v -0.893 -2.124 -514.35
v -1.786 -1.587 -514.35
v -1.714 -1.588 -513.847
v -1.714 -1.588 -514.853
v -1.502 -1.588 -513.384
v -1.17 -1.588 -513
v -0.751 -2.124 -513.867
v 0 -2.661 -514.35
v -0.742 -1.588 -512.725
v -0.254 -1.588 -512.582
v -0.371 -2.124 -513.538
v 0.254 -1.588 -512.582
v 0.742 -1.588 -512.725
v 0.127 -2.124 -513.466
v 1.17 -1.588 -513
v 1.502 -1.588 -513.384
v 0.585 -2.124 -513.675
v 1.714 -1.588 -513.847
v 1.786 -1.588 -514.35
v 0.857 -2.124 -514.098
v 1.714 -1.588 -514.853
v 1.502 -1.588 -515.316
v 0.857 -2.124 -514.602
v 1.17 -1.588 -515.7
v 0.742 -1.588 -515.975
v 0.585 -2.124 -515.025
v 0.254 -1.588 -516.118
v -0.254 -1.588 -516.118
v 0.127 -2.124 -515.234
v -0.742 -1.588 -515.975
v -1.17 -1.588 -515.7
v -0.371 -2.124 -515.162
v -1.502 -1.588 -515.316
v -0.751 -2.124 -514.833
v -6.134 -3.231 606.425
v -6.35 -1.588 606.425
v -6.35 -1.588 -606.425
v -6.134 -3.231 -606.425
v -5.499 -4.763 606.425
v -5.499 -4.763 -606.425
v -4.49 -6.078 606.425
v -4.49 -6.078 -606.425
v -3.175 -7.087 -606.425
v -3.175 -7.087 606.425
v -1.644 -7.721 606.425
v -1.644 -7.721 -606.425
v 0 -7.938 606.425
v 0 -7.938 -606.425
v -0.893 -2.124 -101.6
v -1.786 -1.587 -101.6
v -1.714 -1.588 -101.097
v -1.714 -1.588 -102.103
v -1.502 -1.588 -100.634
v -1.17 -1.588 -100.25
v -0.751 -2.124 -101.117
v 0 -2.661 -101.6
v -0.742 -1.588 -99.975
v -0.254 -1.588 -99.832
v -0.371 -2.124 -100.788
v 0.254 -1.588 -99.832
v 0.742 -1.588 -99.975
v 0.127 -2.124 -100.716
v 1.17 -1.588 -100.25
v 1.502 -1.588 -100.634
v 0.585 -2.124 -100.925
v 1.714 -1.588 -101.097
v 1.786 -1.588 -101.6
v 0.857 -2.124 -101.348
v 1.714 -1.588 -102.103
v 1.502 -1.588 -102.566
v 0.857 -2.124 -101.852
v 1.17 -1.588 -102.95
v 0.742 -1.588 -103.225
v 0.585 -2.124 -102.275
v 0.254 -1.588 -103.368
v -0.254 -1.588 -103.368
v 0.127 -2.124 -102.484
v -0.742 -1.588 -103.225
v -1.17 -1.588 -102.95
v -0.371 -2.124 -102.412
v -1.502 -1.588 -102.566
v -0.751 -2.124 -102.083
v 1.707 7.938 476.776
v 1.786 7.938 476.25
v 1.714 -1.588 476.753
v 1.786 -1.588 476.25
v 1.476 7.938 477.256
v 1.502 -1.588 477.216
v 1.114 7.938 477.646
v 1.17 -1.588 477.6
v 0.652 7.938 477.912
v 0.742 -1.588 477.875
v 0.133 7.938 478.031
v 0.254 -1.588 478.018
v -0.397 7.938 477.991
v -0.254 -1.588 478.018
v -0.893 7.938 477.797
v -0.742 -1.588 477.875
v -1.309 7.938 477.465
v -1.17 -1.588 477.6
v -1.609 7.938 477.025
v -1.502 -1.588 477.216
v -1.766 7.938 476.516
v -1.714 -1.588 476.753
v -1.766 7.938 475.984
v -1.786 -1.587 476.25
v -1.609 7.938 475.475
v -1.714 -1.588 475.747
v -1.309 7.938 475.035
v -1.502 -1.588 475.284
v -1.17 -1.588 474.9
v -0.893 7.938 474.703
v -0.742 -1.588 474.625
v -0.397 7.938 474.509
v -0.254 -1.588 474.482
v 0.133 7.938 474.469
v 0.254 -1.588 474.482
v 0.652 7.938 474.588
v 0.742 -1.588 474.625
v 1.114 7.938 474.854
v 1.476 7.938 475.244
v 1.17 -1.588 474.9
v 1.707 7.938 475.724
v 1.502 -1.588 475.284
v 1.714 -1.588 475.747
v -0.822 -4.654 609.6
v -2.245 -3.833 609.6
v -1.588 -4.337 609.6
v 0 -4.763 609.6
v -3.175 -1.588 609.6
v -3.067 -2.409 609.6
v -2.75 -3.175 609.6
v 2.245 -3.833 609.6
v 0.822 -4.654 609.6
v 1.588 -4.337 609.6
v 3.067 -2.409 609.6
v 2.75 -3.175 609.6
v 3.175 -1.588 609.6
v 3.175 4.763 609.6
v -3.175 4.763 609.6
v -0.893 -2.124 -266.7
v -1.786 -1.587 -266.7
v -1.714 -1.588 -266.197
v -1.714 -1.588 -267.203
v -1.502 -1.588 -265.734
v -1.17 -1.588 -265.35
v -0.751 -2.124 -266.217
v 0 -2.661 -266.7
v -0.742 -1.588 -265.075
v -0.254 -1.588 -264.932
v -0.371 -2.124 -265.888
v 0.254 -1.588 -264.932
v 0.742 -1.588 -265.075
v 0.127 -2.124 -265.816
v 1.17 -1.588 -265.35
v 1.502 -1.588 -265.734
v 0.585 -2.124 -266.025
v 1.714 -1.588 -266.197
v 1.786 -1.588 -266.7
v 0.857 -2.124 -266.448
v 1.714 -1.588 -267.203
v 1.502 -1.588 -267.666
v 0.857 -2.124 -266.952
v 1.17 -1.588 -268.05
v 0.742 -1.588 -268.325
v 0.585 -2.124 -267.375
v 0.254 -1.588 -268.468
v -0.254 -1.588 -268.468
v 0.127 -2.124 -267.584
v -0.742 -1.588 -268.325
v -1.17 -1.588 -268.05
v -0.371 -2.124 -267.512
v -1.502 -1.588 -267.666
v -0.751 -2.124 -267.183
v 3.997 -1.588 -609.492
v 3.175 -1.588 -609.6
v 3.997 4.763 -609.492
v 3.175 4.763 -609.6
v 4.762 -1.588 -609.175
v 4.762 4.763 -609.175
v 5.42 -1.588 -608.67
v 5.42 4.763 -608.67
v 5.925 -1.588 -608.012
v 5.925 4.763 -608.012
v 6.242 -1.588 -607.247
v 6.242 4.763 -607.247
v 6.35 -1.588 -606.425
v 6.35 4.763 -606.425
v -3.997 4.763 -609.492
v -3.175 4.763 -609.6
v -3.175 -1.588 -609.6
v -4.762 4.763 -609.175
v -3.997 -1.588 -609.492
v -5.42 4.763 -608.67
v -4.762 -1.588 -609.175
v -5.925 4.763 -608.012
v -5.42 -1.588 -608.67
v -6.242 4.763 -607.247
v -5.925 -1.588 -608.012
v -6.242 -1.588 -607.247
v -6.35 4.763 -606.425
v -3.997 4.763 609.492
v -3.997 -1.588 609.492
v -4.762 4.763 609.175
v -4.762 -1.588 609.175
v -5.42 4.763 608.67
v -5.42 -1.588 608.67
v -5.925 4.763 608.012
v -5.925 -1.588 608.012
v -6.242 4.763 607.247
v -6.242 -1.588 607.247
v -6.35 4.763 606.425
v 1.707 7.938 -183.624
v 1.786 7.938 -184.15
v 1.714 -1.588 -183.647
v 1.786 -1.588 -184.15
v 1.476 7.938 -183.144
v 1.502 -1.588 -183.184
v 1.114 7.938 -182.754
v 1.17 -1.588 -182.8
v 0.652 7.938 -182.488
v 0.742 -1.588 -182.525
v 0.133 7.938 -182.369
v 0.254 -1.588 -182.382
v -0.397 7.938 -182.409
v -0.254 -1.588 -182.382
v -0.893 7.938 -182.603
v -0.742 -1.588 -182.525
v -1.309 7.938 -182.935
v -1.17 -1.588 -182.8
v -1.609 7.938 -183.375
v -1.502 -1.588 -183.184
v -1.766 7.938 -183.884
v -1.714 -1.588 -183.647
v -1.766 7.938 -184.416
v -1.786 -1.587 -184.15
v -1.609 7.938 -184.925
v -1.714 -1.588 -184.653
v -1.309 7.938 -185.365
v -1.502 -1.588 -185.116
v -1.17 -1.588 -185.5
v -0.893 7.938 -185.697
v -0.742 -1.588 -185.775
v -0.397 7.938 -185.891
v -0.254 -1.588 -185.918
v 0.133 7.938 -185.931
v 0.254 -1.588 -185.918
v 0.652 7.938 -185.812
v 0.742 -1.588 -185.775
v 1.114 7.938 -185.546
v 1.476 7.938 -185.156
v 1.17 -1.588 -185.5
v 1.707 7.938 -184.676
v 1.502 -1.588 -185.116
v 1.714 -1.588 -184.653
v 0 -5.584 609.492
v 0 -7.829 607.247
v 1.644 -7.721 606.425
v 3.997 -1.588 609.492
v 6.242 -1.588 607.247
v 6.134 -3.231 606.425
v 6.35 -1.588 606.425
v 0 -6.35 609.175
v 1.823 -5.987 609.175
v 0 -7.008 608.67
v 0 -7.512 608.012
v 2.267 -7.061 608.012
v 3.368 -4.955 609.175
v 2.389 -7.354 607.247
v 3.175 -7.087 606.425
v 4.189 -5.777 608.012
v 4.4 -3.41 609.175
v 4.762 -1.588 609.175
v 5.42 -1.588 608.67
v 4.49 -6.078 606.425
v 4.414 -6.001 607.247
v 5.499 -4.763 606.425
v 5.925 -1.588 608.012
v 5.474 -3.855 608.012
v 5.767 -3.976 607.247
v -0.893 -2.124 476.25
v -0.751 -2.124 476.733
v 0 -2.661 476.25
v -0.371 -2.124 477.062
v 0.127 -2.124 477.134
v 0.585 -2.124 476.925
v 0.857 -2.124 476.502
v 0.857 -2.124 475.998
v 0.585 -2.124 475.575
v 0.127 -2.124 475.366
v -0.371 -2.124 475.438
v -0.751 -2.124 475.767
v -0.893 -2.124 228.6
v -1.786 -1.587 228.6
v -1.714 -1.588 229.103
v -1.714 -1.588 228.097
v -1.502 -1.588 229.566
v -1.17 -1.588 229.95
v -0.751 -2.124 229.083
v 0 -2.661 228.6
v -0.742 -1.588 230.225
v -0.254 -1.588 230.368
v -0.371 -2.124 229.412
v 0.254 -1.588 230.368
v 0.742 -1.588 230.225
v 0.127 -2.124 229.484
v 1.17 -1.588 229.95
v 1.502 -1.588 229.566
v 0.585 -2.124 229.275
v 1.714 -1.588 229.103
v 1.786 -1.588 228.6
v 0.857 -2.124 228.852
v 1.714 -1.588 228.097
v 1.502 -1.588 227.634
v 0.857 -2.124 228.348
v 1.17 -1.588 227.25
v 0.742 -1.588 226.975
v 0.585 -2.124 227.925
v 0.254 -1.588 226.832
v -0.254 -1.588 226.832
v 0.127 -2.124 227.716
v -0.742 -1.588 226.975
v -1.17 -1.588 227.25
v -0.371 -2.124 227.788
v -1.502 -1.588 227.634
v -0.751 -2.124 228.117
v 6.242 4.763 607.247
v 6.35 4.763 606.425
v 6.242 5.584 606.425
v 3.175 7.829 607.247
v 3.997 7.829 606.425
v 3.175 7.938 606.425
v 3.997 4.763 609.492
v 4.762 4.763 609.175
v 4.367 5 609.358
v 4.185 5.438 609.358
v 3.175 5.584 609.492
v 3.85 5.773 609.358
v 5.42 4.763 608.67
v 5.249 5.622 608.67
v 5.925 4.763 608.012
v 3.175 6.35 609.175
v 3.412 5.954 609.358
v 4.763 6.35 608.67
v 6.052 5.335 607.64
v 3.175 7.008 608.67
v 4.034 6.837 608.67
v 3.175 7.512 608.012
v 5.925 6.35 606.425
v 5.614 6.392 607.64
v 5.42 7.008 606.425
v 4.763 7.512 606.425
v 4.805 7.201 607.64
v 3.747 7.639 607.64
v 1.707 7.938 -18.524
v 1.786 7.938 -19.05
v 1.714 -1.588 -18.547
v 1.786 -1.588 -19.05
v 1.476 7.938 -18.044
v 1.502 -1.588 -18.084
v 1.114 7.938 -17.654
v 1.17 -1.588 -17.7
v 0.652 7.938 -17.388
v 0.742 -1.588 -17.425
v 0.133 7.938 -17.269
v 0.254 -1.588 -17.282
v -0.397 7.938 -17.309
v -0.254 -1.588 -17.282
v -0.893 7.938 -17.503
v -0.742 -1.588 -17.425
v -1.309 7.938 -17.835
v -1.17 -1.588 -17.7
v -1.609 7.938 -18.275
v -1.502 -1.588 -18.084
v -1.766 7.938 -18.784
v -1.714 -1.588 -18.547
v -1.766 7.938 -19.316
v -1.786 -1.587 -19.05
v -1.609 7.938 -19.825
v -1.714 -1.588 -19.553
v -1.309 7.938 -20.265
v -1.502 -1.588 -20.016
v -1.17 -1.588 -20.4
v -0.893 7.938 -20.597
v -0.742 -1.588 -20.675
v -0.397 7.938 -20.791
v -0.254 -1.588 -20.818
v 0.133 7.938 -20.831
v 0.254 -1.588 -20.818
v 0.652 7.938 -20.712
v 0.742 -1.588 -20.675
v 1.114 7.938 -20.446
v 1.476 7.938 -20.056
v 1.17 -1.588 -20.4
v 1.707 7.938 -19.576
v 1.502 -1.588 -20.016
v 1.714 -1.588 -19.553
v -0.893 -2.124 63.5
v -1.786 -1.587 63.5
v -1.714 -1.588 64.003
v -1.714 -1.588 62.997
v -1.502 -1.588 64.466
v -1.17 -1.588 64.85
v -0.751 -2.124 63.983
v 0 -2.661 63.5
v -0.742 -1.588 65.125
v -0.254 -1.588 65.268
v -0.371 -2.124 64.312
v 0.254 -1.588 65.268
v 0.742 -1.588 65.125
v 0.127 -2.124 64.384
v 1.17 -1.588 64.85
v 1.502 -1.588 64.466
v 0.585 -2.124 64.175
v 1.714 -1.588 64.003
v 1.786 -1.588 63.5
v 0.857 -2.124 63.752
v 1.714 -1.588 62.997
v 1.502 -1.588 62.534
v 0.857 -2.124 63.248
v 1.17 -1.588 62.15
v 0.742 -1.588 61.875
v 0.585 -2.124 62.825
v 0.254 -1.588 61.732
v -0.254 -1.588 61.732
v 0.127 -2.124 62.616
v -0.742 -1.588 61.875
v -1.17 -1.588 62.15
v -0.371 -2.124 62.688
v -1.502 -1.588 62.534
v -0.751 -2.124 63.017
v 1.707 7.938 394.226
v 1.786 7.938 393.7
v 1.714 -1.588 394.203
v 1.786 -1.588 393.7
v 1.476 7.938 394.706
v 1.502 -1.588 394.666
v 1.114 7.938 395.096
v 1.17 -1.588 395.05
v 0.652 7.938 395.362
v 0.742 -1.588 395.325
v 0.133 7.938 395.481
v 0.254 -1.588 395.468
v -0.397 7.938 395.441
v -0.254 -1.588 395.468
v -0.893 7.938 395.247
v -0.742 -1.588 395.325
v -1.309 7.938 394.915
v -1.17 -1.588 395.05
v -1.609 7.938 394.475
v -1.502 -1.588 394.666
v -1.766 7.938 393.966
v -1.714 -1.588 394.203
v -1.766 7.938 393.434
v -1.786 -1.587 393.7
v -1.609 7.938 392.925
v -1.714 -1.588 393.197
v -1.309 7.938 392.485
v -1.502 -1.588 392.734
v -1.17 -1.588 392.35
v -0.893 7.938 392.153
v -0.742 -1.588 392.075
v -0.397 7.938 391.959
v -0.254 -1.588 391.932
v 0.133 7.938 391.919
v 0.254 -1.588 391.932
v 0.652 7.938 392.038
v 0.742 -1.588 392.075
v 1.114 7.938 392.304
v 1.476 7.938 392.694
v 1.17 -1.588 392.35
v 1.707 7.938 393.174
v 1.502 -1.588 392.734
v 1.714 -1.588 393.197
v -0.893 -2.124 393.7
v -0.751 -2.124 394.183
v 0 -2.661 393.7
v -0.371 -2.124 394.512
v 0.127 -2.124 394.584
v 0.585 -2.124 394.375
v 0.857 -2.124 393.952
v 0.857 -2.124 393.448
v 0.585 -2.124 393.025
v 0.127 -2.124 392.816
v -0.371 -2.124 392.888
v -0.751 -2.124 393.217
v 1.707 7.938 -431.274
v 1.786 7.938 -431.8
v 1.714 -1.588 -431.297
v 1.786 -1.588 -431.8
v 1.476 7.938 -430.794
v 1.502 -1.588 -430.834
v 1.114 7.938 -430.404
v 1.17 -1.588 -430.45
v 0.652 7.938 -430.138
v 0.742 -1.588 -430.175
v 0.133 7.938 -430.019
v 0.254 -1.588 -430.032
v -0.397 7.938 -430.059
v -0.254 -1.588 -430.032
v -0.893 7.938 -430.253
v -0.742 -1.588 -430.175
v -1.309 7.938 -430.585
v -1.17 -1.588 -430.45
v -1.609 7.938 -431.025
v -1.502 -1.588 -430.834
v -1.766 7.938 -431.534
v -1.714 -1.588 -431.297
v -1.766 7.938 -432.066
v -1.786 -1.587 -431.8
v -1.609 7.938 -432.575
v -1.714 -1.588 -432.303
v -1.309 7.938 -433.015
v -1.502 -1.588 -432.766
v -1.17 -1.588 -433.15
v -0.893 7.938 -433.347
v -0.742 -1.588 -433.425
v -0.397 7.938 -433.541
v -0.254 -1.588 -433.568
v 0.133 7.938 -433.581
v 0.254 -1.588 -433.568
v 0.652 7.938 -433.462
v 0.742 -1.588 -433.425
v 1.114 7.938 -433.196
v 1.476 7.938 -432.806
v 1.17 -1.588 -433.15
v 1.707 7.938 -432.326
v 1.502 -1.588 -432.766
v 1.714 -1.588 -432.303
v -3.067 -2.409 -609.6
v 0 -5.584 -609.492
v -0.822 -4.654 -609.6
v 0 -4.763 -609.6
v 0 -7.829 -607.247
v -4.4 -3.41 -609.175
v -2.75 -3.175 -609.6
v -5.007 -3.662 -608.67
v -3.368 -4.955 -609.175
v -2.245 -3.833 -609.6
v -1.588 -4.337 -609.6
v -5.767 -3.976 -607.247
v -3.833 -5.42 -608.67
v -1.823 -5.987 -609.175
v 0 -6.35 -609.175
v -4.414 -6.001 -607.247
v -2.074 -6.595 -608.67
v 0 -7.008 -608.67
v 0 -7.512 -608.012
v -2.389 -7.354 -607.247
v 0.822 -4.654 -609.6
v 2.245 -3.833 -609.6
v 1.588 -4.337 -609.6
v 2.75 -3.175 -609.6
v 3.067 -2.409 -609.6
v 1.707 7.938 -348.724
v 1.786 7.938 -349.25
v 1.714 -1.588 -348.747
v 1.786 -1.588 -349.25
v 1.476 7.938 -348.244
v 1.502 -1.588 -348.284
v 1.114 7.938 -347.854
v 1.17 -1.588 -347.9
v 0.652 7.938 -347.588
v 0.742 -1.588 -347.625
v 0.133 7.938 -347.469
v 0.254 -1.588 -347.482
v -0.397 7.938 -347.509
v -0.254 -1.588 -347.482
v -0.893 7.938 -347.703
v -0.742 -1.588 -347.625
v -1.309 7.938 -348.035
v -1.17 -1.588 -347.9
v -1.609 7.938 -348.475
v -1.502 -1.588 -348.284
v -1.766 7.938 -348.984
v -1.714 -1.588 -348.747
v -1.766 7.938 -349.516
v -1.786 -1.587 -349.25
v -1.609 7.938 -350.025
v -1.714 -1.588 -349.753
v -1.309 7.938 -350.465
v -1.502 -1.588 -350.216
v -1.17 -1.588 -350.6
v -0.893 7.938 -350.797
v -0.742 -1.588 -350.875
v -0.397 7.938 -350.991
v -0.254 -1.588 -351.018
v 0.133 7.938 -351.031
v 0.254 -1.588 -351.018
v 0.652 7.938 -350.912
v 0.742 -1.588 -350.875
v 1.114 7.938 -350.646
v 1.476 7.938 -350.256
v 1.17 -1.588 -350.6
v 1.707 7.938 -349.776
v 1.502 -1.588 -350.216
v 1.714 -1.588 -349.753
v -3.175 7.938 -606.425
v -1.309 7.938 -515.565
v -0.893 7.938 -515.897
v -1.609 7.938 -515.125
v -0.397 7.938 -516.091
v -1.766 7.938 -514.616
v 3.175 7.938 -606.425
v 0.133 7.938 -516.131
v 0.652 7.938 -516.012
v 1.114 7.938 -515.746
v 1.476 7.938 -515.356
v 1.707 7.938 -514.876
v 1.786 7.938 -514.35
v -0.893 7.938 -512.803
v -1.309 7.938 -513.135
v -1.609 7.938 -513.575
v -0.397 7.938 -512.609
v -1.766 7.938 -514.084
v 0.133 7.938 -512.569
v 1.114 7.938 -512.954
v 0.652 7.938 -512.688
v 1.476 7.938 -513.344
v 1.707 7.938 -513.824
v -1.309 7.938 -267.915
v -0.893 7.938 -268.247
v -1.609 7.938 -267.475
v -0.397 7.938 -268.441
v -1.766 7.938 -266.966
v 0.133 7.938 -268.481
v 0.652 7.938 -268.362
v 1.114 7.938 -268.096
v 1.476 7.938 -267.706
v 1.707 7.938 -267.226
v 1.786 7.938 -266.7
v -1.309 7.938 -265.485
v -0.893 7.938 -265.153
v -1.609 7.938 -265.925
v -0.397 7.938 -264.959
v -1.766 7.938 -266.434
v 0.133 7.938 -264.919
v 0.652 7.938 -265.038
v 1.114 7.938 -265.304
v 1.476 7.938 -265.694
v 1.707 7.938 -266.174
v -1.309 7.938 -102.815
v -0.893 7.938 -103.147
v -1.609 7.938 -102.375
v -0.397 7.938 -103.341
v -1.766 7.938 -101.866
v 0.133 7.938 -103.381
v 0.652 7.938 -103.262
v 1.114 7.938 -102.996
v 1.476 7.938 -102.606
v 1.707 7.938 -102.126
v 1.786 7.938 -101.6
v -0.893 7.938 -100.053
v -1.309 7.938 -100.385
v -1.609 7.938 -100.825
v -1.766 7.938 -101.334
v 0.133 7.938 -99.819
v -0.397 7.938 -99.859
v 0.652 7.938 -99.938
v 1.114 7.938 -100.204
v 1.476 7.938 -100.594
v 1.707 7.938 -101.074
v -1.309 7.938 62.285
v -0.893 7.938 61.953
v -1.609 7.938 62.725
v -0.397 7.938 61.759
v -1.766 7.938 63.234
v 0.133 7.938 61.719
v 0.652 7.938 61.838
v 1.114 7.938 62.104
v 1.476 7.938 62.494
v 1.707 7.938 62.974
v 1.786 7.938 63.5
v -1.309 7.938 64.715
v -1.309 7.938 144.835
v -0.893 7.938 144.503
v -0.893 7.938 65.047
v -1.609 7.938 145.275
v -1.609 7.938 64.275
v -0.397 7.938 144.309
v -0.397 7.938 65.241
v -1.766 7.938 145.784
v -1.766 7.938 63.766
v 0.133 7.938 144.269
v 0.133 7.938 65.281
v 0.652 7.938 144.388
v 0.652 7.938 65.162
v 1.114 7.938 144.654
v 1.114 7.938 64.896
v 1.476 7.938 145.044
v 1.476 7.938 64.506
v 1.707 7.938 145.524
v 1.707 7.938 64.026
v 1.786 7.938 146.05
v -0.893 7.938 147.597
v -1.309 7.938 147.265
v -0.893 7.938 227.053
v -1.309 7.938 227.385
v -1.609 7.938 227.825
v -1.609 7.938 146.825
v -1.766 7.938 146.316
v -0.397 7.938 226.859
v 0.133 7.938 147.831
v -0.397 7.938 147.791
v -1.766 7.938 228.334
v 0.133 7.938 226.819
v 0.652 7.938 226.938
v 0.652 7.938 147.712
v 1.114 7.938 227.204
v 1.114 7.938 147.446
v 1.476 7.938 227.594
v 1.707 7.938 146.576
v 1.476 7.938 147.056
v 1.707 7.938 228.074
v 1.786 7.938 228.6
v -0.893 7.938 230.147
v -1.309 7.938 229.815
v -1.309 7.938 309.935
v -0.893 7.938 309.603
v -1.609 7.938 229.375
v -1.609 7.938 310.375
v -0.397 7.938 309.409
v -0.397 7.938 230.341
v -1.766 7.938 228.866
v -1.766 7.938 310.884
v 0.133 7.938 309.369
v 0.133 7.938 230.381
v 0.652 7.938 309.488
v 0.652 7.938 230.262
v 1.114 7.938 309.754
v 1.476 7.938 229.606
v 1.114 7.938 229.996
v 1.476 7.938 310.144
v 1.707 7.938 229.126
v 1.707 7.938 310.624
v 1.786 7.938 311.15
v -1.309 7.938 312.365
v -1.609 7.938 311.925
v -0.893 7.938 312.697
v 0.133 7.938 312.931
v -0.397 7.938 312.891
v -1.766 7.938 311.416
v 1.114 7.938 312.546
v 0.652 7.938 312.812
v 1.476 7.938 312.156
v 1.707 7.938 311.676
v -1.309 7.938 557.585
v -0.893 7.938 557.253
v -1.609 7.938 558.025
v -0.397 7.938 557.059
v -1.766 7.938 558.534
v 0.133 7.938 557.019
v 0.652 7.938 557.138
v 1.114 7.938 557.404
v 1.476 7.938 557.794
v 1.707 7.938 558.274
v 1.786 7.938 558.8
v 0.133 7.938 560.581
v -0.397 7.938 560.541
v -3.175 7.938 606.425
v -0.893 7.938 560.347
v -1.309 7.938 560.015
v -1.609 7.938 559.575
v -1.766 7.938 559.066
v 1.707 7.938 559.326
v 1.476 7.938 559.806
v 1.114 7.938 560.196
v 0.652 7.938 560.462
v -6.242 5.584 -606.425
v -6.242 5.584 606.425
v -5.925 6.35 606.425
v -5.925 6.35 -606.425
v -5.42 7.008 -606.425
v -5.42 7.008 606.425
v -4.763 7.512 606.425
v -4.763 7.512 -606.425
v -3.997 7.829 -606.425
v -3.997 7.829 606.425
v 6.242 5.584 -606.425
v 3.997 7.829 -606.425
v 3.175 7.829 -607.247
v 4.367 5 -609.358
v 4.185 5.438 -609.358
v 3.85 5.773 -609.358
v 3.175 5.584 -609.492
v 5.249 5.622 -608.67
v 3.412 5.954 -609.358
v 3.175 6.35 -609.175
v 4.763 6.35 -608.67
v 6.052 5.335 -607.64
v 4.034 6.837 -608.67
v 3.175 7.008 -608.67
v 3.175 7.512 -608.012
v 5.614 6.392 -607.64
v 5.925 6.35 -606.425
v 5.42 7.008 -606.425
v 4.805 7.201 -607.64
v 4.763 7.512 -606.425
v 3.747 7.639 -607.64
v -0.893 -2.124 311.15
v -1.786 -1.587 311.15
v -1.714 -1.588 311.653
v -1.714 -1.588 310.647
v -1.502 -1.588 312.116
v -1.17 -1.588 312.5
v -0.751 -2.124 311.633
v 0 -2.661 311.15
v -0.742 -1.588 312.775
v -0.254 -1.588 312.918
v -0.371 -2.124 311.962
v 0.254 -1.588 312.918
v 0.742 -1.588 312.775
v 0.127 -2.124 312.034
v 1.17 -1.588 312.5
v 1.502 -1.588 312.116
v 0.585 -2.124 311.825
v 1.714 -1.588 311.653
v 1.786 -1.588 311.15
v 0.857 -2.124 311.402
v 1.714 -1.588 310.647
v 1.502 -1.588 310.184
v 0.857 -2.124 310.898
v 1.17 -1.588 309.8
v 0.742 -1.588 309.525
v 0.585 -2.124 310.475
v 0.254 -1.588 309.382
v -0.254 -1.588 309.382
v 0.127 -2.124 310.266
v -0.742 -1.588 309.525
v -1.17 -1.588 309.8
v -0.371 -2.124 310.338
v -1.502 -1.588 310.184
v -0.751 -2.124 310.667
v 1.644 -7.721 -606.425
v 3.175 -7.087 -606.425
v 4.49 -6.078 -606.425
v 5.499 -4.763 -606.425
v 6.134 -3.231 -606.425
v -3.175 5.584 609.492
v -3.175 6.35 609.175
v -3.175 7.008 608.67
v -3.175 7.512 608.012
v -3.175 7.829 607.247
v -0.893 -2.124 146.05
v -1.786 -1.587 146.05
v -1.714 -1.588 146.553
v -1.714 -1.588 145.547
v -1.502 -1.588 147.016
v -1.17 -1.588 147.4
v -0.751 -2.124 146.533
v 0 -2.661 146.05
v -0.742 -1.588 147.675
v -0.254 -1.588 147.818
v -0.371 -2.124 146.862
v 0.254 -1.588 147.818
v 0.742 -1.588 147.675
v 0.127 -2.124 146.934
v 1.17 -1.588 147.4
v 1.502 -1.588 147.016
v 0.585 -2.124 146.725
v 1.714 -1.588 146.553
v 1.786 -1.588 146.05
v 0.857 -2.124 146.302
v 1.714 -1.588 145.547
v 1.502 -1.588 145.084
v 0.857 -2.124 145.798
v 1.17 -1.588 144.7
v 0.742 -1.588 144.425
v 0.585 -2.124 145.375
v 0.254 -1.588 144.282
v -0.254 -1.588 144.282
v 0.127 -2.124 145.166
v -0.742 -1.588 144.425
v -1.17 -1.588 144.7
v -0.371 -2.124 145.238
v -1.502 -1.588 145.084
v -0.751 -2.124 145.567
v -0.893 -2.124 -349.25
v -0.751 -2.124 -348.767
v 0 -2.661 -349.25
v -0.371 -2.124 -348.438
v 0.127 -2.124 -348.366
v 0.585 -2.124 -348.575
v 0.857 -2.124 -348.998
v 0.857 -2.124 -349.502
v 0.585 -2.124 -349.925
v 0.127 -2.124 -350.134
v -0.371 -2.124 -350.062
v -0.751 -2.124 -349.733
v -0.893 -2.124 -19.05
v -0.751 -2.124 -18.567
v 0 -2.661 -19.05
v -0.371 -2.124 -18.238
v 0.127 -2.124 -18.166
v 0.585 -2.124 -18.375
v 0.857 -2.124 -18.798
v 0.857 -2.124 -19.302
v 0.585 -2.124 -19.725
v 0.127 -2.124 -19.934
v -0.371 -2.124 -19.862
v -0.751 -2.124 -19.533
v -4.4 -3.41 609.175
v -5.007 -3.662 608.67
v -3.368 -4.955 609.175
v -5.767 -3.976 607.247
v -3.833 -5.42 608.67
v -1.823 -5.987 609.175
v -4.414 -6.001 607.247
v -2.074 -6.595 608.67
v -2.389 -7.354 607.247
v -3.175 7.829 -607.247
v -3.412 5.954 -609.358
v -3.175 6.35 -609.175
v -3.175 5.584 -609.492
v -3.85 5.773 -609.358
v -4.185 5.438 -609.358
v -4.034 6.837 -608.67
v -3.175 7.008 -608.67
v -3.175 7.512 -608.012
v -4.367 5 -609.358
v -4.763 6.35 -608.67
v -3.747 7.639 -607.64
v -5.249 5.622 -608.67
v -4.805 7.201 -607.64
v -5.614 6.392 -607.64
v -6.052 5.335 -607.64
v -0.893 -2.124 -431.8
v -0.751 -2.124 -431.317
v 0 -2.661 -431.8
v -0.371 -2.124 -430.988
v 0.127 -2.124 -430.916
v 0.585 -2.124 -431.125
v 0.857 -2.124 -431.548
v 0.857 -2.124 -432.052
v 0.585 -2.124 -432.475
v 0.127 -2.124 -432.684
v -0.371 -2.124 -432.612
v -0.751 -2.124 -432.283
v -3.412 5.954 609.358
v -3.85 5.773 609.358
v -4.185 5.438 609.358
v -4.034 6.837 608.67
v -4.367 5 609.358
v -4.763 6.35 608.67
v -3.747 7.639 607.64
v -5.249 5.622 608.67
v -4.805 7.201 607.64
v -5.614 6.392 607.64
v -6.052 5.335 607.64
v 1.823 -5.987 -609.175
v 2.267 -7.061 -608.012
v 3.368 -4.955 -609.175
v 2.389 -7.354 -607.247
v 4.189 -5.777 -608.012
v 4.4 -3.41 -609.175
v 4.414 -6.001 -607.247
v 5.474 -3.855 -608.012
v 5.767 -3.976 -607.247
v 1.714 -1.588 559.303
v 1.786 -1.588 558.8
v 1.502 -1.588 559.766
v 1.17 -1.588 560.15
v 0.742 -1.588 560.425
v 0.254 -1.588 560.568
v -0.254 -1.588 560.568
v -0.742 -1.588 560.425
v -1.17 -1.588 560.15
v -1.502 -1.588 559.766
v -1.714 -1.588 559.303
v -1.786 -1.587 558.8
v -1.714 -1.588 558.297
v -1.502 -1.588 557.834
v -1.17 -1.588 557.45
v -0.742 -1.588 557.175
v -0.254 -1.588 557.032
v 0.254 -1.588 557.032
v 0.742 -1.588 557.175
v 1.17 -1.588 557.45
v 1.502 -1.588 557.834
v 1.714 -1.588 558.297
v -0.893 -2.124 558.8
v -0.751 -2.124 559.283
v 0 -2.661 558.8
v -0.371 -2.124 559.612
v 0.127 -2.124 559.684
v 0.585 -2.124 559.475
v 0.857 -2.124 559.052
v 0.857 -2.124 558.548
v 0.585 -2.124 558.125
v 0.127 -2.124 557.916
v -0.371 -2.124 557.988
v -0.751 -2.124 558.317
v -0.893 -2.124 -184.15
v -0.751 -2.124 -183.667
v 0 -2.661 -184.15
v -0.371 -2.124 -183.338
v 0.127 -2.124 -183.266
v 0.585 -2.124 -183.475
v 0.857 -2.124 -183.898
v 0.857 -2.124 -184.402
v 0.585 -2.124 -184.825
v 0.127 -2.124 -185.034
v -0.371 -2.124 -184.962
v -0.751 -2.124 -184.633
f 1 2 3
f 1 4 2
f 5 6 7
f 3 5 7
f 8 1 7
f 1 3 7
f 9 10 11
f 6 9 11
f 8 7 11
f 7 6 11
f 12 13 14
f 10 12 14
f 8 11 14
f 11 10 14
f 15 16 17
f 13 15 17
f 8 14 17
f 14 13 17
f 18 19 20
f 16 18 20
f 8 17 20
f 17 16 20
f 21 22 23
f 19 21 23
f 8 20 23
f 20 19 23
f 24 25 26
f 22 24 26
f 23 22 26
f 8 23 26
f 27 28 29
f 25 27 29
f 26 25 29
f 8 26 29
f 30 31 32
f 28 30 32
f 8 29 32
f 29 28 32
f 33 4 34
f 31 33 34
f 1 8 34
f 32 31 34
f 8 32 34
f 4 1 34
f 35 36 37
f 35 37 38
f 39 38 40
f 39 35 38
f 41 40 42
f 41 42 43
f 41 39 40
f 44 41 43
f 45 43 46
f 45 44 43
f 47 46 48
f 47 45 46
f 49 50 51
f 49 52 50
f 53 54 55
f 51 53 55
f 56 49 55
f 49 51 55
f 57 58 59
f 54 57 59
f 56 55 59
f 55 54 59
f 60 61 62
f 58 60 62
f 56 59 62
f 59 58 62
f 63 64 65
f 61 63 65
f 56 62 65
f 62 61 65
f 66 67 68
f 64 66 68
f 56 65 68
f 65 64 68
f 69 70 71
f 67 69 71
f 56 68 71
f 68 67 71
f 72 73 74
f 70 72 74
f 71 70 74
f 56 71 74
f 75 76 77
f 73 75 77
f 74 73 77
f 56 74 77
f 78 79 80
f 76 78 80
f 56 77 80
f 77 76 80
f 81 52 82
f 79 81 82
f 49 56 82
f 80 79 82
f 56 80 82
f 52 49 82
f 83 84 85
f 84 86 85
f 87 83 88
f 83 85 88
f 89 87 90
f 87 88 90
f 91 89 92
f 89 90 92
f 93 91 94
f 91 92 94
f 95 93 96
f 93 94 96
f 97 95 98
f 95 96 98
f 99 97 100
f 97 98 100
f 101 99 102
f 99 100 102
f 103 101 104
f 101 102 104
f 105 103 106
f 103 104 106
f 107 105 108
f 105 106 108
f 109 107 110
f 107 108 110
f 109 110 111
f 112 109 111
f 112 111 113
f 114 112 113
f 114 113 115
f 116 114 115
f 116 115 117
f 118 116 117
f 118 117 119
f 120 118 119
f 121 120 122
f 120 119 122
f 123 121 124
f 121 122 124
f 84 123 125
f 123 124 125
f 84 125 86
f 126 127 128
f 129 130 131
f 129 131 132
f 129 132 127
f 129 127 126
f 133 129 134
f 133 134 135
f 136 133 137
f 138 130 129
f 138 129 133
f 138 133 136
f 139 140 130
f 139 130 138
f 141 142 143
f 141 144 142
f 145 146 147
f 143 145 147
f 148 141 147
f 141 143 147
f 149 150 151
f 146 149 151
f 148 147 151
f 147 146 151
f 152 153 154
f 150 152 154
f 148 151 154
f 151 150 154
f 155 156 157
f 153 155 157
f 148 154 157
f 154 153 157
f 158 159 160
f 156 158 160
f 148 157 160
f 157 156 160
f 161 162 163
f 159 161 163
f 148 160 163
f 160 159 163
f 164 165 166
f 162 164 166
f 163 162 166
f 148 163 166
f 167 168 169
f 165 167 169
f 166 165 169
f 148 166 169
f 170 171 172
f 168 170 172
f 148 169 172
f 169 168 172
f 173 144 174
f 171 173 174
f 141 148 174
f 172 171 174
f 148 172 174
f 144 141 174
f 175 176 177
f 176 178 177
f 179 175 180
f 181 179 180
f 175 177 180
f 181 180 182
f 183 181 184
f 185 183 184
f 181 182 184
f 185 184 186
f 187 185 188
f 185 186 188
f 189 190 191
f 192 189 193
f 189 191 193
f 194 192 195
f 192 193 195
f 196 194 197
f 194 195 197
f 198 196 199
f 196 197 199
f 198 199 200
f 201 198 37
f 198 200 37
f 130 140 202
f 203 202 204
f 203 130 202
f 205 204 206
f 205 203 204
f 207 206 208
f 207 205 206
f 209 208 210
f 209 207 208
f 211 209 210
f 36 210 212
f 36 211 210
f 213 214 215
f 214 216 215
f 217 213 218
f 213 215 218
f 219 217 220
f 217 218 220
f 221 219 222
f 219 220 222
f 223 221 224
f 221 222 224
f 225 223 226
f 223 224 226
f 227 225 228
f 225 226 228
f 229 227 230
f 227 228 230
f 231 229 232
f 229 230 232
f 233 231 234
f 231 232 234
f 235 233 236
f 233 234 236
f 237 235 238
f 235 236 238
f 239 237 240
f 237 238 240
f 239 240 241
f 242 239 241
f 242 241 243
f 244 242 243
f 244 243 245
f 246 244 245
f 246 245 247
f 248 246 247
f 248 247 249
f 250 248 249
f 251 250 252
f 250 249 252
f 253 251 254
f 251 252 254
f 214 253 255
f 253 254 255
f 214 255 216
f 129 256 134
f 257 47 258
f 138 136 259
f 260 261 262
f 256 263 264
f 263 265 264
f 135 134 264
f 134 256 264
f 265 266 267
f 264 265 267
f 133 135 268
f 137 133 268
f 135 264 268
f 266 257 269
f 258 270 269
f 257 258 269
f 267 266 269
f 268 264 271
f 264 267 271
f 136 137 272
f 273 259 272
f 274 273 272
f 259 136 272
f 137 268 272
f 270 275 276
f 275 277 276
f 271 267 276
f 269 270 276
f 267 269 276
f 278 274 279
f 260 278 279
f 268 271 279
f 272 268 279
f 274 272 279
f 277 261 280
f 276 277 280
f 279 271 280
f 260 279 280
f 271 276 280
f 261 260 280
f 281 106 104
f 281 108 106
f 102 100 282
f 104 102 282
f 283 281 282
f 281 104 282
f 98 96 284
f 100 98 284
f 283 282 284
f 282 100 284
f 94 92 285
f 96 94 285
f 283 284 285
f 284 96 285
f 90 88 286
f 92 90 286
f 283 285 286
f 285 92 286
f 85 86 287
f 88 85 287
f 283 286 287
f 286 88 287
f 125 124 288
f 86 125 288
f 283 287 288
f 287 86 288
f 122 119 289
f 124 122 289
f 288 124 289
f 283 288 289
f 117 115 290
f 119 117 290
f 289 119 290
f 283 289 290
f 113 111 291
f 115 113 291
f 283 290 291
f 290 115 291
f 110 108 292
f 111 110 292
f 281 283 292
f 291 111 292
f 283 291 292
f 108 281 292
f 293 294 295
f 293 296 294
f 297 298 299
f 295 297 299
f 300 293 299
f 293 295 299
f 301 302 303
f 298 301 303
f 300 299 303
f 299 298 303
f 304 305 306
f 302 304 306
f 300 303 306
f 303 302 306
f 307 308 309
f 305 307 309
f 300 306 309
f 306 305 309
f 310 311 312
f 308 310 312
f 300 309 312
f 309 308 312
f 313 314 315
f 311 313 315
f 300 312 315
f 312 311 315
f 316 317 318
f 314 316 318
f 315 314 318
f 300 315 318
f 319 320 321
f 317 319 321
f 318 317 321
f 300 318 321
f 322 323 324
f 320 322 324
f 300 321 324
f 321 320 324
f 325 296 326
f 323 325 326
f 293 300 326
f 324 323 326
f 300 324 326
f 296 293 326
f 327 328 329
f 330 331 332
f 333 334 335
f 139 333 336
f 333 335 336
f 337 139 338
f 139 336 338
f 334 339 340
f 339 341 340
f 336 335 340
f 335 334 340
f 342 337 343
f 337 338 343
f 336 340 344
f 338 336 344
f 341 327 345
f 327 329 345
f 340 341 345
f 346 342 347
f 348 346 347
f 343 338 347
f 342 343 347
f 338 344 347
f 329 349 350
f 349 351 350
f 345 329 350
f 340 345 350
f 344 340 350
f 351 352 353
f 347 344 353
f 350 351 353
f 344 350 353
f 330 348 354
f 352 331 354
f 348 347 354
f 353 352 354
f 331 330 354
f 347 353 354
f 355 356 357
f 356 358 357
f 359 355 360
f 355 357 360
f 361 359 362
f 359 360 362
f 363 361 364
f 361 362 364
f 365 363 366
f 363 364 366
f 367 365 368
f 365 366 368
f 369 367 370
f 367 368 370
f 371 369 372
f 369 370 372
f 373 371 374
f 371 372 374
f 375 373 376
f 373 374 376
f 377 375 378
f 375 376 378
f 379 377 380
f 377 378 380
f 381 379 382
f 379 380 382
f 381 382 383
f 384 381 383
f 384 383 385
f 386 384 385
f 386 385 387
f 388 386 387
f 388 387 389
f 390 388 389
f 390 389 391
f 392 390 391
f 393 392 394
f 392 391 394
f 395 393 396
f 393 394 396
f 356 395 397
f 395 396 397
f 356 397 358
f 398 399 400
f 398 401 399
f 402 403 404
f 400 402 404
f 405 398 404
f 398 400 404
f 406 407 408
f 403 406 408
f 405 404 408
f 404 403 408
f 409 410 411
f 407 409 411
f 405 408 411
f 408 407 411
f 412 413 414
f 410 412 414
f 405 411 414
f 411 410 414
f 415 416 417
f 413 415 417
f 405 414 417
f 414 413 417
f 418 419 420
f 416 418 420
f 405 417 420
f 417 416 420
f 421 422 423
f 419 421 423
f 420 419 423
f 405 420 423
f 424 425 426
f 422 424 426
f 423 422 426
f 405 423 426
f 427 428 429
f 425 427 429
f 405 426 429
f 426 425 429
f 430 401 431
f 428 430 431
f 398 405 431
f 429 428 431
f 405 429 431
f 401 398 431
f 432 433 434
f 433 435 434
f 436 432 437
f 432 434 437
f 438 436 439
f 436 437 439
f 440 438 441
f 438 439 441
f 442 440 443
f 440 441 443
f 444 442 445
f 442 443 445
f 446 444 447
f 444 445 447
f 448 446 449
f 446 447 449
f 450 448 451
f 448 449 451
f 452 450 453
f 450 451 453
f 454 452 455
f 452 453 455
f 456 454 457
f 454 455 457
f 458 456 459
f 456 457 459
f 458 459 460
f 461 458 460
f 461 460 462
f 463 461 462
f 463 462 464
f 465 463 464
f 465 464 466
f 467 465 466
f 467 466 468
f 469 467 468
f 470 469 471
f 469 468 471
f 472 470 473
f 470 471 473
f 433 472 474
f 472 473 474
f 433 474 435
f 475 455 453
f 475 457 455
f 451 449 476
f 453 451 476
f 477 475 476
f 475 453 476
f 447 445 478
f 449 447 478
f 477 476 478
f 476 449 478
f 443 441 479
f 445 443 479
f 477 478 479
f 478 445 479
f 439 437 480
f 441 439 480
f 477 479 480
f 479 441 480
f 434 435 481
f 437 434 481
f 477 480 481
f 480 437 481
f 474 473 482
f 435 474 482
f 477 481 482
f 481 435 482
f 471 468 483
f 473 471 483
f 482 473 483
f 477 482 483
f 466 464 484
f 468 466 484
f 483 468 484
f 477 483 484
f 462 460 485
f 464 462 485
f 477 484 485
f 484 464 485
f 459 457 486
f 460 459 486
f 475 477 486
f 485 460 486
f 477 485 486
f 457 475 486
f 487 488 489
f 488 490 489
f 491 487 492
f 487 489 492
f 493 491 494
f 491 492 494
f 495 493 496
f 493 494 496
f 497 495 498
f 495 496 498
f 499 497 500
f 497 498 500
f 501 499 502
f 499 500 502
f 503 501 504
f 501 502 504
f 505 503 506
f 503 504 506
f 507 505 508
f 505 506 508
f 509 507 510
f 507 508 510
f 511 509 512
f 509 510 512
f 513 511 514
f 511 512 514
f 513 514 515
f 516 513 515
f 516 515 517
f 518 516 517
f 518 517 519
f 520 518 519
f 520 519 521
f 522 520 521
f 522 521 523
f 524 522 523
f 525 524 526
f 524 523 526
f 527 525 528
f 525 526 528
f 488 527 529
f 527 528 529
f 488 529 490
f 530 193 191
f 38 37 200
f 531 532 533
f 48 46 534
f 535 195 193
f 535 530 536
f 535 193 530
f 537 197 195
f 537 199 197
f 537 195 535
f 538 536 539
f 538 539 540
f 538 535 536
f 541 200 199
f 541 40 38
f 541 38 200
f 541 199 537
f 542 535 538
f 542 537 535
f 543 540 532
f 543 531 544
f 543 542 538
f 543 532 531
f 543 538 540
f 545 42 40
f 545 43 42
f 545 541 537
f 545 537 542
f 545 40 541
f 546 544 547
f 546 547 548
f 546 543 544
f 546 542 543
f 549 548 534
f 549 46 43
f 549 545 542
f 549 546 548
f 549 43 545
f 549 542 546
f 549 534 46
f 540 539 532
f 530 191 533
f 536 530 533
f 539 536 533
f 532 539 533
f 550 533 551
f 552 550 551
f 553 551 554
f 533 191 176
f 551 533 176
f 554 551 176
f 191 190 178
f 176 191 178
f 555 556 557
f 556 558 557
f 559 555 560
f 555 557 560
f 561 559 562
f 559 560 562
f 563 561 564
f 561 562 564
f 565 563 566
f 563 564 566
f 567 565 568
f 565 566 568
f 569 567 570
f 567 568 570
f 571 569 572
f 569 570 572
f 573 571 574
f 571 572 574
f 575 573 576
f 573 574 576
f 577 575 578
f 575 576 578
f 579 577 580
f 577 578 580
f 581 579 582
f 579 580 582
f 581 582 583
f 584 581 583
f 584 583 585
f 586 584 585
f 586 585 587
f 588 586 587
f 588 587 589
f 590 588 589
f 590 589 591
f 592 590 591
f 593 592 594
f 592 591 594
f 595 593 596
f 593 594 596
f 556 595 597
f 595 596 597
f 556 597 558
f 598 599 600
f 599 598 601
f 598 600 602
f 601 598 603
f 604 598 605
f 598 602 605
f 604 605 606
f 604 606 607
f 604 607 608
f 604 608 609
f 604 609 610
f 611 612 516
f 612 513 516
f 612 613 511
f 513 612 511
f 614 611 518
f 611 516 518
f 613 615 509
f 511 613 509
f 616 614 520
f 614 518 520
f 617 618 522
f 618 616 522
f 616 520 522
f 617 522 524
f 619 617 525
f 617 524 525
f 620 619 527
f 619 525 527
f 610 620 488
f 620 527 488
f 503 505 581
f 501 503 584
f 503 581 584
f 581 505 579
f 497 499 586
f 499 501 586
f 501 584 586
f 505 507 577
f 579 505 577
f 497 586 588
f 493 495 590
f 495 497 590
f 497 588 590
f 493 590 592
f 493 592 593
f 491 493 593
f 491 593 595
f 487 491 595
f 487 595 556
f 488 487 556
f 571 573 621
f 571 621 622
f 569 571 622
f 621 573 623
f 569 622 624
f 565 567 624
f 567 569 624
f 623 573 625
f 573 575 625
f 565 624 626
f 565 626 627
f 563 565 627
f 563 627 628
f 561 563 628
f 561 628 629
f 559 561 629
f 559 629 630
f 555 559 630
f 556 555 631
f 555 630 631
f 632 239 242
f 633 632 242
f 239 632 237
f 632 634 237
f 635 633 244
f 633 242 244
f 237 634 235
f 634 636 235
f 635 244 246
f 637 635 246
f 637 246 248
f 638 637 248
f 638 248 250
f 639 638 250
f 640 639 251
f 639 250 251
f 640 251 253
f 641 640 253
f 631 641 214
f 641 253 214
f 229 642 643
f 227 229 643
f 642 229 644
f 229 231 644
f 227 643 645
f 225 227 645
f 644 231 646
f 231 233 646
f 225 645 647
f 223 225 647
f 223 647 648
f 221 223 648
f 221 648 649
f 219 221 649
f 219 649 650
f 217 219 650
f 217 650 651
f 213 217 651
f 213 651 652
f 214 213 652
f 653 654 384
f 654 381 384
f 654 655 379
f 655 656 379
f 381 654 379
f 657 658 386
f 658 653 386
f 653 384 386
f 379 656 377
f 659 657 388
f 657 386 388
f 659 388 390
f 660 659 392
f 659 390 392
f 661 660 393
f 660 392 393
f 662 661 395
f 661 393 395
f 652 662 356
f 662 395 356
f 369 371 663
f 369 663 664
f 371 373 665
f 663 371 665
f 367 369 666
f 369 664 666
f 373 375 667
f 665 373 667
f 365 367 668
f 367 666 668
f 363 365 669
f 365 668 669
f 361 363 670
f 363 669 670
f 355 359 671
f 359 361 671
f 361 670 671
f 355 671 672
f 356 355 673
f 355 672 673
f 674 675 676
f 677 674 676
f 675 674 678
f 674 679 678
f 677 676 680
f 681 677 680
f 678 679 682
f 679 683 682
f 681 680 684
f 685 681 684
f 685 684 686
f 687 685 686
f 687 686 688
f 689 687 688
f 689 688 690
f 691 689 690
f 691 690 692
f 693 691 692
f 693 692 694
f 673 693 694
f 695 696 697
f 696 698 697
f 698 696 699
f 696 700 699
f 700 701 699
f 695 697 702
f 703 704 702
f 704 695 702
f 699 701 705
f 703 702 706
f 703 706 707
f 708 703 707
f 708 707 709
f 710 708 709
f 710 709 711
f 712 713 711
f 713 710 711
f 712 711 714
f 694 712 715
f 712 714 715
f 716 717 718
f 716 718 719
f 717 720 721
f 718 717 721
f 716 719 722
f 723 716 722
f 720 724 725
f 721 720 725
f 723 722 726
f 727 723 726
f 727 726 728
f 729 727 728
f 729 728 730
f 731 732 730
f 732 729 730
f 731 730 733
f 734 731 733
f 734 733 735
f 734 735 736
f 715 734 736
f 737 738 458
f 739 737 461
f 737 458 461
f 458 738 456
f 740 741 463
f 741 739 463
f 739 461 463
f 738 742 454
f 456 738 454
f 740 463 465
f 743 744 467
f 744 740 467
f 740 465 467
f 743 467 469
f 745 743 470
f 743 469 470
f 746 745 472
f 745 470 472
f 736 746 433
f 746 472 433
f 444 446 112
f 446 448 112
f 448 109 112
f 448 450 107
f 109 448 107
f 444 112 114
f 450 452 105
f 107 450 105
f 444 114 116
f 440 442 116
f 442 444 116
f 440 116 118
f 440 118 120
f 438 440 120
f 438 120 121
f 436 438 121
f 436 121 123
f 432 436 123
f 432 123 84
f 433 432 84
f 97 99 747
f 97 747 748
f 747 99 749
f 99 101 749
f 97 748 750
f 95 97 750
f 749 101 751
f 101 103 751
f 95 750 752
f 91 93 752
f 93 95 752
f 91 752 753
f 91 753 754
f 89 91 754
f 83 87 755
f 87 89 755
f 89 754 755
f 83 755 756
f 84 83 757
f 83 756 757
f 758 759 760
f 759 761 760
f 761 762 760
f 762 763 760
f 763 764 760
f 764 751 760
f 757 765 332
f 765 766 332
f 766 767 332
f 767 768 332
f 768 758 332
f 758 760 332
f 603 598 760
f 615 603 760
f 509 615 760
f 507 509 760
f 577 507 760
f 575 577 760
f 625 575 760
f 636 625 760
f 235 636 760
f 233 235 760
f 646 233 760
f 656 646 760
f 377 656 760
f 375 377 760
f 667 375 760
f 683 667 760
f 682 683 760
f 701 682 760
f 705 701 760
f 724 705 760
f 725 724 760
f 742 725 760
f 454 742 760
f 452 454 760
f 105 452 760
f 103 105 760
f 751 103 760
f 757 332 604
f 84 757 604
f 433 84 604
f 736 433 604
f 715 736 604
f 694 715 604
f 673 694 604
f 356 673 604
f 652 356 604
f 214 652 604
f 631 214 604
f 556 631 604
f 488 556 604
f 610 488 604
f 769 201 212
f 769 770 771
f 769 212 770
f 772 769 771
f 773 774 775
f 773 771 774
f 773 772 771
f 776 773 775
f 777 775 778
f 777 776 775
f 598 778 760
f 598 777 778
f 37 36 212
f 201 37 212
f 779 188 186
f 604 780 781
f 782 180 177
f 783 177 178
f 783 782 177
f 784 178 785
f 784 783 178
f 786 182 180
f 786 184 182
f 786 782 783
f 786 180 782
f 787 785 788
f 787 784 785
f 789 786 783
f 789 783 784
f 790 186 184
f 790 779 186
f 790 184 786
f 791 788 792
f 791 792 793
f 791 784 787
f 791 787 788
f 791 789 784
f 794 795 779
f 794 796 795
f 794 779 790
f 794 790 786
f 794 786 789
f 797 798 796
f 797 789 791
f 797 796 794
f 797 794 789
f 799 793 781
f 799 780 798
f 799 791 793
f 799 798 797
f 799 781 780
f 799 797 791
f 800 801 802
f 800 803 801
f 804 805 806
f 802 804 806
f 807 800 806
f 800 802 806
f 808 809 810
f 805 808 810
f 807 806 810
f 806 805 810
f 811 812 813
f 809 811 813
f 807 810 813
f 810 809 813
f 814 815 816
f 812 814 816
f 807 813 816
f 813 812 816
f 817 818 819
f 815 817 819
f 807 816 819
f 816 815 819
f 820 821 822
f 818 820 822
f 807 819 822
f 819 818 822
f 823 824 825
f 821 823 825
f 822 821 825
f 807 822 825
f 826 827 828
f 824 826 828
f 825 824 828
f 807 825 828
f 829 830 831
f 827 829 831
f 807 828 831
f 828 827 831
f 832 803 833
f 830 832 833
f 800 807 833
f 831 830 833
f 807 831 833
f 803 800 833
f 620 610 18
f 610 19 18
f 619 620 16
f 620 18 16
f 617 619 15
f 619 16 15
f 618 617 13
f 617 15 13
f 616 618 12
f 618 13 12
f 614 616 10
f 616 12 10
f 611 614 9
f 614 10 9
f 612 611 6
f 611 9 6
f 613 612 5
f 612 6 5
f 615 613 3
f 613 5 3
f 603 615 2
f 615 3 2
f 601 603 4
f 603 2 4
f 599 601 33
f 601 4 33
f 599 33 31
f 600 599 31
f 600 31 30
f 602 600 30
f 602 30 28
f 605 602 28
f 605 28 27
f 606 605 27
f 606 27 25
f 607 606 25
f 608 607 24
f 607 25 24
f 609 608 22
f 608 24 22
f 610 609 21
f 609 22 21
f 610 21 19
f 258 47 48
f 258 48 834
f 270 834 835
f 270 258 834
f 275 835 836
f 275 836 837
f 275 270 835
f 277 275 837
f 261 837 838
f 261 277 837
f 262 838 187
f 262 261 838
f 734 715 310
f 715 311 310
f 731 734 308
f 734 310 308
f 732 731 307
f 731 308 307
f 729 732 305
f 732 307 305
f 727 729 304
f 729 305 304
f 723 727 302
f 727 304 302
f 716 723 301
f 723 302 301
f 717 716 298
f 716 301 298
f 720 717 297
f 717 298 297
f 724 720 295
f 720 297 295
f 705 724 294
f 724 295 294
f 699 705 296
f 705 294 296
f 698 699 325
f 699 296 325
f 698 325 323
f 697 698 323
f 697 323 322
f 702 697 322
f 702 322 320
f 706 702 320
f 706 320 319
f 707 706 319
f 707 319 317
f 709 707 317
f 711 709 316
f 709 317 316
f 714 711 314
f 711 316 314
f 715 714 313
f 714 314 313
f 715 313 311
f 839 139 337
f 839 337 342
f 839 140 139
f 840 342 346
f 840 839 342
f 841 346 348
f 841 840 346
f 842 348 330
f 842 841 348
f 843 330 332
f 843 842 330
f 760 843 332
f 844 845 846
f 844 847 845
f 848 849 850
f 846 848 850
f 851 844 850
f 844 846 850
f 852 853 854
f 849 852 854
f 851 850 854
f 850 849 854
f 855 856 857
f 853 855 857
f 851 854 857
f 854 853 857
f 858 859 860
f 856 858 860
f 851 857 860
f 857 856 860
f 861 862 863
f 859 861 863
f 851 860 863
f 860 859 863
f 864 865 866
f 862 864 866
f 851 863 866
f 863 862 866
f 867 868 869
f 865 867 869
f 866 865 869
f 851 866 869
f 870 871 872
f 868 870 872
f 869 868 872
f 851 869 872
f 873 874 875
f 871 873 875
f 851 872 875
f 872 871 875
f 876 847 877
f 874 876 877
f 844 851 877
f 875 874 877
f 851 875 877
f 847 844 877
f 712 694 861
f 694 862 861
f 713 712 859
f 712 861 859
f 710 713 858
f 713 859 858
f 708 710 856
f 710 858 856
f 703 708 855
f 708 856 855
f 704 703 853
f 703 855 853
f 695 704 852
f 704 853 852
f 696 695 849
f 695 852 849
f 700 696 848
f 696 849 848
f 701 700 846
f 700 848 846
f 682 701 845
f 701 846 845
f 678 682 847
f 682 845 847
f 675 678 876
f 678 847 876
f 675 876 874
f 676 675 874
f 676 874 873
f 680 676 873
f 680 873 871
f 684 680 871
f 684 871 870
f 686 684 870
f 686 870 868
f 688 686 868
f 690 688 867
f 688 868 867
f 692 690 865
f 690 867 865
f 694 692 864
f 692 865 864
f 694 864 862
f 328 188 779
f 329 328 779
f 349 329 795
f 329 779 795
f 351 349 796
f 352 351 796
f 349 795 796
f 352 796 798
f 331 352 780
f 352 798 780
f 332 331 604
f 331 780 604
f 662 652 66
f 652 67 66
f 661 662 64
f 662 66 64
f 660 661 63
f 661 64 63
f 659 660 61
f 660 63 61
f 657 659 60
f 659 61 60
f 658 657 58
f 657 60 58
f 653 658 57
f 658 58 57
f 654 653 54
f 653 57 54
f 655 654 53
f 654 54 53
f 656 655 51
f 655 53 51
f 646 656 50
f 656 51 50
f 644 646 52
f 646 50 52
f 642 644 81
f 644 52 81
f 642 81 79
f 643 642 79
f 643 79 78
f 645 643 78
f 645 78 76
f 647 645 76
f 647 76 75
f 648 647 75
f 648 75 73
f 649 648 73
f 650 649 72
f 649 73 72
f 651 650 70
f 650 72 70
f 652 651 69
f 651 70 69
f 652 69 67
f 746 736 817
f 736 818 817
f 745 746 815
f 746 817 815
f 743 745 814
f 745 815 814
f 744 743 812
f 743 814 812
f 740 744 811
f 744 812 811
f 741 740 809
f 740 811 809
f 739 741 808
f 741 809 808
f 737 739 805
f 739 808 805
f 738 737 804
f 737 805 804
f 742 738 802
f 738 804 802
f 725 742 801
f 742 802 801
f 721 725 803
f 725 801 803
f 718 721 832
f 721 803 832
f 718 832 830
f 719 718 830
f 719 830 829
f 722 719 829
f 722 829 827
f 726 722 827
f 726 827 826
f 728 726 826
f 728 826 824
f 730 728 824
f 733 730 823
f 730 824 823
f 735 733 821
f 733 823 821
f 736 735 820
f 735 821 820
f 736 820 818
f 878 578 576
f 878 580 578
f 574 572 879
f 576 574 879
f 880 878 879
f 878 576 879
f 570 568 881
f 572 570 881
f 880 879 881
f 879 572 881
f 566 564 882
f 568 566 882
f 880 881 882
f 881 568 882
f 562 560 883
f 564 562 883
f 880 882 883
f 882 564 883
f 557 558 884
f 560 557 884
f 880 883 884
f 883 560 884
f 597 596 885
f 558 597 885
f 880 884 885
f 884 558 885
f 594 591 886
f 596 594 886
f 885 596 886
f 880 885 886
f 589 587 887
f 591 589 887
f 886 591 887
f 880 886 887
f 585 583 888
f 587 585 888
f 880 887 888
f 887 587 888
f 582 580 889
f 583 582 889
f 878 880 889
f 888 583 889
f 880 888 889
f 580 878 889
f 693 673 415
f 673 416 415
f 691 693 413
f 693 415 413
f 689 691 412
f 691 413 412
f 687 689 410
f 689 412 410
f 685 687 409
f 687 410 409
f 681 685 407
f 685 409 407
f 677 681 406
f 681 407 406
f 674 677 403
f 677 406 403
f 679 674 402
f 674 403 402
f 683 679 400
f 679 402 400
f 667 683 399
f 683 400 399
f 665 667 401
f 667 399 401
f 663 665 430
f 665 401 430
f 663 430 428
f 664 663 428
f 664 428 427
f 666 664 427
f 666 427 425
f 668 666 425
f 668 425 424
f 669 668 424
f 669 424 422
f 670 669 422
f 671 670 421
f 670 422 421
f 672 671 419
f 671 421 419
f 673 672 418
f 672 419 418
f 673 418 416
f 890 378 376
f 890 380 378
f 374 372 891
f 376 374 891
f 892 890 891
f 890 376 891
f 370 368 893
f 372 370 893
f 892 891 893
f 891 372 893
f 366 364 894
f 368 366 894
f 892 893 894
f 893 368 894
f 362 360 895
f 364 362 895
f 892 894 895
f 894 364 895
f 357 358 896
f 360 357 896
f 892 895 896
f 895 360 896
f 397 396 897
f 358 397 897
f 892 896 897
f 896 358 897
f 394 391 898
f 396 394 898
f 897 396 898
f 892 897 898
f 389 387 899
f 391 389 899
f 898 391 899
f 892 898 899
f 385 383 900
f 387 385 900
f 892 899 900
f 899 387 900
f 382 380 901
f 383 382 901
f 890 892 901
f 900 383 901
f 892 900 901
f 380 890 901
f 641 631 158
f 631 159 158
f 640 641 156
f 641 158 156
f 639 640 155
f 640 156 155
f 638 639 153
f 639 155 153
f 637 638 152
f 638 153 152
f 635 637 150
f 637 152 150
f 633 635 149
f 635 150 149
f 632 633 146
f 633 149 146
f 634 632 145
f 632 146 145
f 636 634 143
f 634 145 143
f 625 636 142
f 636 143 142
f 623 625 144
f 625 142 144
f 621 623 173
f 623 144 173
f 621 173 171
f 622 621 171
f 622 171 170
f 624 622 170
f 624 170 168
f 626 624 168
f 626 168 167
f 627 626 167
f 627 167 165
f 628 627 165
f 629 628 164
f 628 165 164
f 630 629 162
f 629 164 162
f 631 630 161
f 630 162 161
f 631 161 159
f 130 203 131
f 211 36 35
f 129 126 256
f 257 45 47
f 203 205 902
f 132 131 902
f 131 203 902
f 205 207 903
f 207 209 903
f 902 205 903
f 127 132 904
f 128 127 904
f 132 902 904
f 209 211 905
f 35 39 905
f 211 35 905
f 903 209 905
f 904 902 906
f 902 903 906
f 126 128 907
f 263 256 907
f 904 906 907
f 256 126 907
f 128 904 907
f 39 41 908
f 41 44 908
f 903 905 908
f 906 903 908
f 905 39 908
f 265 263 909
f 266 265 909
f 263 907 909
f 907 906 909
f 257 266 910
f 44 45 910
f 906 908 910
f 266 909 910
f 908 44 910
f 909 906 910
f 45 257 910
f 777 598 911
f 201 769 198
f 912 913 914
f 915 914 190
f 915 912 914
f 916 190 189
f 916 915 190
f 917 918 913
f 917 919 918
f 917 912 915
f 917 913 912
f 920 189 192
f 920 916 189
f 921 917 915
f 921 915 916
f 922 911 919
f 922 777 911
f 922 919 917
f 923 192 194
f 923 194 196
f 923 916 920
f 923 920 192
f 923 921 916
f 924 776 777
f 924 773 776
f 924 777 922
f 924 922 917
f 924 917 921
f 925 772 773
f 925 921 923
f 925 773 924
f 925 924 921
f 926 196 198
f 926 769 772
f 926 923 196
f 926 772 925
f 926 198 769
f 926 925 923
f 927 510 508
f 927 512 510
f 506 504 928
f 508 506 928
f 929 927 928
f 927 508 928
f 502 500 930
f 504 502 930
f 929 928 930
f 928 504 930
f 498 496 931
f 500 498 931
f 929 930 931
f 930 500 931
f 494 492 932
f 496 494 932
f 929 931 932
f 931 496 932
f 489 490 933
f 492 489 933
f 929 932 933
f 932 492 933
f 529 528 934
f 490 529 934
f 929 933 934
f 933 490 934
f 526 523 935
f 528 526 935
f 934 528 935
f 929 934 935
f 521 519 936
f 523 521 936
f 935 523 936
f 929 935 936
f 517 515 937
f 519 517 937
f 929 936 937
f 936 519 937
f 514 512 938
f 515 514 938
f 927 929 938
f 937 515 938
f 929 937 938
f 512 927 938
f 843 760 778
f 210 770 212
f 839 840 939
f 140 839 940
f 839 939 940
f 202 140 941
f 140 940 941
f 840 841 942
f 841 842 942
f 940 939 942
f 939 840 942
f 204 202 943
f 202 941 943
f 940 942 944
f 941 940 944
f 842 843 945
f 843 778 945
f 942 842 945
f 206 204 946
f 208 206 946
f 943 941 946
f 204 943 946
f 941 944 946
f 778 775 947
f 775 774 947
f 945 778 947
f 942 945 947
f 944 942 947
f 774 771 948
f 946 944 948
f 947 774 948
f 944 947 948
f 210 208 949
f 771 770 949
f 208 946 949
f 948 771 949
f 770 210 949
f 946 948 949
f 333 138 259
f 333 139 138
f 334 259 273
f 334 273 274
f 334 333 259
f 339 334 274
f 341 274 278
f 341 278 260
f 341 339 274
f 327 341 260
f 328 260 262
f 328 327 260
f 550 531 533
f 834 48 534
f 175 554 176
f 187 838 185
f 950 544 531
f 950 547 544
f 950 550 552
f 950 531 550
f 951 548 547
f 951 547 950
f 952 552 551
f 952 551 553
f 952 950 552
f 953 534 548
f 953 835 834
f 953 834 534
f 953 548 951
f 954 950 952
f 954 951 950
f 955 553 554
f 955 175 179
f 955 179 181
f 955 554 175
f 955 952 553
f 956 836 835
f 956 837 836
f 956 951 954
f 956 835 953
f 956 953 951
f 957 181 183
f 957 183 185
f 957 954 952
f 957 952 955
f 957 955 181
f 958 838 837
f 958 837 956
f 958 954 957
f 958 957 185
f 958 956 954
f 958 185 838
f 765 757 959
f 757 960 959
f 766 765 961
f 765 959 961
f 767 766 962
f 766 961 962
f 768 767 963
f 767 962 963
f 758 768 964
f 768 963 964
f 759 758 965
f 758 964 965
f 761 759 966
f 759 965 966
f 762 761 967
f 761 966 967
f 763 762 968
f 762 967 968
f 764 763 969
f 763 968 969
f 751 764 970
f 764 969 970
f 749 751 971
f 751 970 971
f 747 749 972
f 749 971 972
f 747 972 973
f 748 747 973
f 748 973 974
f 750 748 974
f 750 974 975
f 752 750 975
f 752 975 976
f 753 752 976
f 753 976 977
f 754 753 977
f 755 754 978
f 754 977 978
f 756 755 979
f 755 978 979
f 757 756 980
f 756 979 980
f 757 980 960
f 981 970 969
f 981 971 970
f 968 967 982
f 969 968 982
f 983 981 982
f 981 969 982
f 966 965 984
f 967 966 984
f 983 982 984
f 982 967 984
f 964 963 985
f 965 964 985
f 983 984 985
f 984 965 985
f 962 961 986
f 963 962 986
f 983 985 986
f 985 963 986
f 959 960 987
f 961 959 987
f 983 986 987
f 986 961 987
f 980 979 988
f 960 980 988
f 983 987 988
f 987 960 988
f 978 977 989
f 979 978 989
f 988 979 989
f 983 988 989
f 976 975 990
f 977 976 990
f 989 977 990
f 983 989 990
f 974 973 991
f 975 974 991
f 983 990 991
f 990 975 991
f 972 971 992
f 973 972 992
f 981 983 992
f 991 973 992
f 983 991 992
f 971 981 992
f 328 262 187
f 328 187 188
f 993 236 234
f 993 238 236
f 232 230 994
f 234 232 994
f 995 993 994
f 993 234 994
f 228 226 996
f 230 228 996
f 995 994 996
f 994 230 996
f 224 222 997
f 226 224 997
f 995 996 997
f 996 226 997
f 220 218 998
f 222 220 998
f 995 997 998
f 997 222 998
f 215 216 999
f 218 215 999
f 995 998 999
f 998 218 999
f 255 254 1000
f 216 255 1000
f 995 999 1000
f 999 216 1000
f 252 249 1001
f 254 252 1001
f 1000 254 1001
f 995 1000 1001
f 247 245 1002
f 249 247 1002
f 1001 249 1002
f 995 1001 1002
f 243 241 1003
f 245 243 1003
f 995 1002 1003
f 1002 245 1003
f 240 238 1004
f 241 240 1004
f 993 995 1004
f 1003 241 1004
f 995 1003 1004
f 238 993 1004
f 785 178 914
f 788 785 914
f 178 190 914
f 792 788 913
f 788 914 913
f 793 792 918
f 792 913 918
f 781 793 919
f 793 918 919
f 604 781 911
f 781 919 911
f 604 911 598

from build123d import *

# Parameters (mm, degrees)
F0_W     = 12.7
F0_H     = 15.875
F1_DEPTH = 609.6
F2_R     = 3.175
F3_R     = 6.34999
F4_R     = 3.175
F6_D     = 3.571875
F6_DEPTH = 9.525
F6_TIP   = 1.0730995118


# Not quite as in the source:
# - a fillet or chamfer is up to 0.001 mm smaller than in the source, because OpenCascade refuses the exact size


with BuildPart() as f1:
    # F0 (on Top) → F1 (new body, symmetric)
    with BuildSketch(Plane.XY):
        Rectangle(F0_W, F0_H)
    extrude(amount=F1_DEPTH, both=True)

    # F2
    f2_edges = [f1.edges().sort_by_distance(p)[0] for p in [
        (6.35, 7.9375, 0),
        (-6.35, 7.9375, 0),
    ]]
    fillet(f2_edges, radius=F2_R)

    # F3 (radius 6.35 in the source; OpenCascade refuses exactly that, so slightly less here)
    f3_edges = [f1.edges().sort_by_distance(p)[0] for p in [
        (-6.35, -7.9375, 0),
        (6.35, -7.9375, 0),
    ]]
    fillet(f3_edges, radius=F3_R)

    # F4
    f4_edges = [f1.edges().sort_by_distance(p)[0] for p in [
        (6.35, 1.587495, 609.6),
        (4.490131, -6.077631, 609.6),
        (5.420064, 7.007564, 609.6),
        (0, -7.9375, 609.6),
        (0, 7.9375, 609.6),
        (-4.490131, -6.077631, 609.6),
        (-5.420064, 7.007564, 609.6),
        (-6.35, 1.587495, 609.6),
        (6.35, 1.587495, -609.6),
        (4.490131, -6.077631, -609.6),
        (5.420064, 7.007564, -609.6),
        (0, -7.9375, -609.6),
        (0, 7.9375, -609.6),
        (-4.490131, -6.077631, -609.6),
        (-5.420064, 7.007564, -609.6),
        (-6.35, 1.587495, -609.6),
    ]]
    fillet(f4_edges, radius=F4_R)

    # F6
    with Locations(Plane(origin=(0, 7.9375, 0), x_dir=(-1, 0, 0), z_dir=(0, 1, 0))):
        with Locations((0, 558.8), (0, 476.25), (0, 393.7), (0, 311.15), (0, 228.6), (0, 146.05), (0, 63.5), (0, -19.05), (0, -101.6), (0, -184.15), (0, -266.7), (0, -349.25), (0, -431.8), (0, -514.35)):
            Hole(F6_D / 2, depth=F6_DEPTH)
            with Locations((0, 0, -(F6_DEPTH + F6_TIP / 2))):  # 118° drill point
                Cone(0, F6_D / 2, F6_TIP, mode=Mode.SUBTRACT)


solid = f1.part
